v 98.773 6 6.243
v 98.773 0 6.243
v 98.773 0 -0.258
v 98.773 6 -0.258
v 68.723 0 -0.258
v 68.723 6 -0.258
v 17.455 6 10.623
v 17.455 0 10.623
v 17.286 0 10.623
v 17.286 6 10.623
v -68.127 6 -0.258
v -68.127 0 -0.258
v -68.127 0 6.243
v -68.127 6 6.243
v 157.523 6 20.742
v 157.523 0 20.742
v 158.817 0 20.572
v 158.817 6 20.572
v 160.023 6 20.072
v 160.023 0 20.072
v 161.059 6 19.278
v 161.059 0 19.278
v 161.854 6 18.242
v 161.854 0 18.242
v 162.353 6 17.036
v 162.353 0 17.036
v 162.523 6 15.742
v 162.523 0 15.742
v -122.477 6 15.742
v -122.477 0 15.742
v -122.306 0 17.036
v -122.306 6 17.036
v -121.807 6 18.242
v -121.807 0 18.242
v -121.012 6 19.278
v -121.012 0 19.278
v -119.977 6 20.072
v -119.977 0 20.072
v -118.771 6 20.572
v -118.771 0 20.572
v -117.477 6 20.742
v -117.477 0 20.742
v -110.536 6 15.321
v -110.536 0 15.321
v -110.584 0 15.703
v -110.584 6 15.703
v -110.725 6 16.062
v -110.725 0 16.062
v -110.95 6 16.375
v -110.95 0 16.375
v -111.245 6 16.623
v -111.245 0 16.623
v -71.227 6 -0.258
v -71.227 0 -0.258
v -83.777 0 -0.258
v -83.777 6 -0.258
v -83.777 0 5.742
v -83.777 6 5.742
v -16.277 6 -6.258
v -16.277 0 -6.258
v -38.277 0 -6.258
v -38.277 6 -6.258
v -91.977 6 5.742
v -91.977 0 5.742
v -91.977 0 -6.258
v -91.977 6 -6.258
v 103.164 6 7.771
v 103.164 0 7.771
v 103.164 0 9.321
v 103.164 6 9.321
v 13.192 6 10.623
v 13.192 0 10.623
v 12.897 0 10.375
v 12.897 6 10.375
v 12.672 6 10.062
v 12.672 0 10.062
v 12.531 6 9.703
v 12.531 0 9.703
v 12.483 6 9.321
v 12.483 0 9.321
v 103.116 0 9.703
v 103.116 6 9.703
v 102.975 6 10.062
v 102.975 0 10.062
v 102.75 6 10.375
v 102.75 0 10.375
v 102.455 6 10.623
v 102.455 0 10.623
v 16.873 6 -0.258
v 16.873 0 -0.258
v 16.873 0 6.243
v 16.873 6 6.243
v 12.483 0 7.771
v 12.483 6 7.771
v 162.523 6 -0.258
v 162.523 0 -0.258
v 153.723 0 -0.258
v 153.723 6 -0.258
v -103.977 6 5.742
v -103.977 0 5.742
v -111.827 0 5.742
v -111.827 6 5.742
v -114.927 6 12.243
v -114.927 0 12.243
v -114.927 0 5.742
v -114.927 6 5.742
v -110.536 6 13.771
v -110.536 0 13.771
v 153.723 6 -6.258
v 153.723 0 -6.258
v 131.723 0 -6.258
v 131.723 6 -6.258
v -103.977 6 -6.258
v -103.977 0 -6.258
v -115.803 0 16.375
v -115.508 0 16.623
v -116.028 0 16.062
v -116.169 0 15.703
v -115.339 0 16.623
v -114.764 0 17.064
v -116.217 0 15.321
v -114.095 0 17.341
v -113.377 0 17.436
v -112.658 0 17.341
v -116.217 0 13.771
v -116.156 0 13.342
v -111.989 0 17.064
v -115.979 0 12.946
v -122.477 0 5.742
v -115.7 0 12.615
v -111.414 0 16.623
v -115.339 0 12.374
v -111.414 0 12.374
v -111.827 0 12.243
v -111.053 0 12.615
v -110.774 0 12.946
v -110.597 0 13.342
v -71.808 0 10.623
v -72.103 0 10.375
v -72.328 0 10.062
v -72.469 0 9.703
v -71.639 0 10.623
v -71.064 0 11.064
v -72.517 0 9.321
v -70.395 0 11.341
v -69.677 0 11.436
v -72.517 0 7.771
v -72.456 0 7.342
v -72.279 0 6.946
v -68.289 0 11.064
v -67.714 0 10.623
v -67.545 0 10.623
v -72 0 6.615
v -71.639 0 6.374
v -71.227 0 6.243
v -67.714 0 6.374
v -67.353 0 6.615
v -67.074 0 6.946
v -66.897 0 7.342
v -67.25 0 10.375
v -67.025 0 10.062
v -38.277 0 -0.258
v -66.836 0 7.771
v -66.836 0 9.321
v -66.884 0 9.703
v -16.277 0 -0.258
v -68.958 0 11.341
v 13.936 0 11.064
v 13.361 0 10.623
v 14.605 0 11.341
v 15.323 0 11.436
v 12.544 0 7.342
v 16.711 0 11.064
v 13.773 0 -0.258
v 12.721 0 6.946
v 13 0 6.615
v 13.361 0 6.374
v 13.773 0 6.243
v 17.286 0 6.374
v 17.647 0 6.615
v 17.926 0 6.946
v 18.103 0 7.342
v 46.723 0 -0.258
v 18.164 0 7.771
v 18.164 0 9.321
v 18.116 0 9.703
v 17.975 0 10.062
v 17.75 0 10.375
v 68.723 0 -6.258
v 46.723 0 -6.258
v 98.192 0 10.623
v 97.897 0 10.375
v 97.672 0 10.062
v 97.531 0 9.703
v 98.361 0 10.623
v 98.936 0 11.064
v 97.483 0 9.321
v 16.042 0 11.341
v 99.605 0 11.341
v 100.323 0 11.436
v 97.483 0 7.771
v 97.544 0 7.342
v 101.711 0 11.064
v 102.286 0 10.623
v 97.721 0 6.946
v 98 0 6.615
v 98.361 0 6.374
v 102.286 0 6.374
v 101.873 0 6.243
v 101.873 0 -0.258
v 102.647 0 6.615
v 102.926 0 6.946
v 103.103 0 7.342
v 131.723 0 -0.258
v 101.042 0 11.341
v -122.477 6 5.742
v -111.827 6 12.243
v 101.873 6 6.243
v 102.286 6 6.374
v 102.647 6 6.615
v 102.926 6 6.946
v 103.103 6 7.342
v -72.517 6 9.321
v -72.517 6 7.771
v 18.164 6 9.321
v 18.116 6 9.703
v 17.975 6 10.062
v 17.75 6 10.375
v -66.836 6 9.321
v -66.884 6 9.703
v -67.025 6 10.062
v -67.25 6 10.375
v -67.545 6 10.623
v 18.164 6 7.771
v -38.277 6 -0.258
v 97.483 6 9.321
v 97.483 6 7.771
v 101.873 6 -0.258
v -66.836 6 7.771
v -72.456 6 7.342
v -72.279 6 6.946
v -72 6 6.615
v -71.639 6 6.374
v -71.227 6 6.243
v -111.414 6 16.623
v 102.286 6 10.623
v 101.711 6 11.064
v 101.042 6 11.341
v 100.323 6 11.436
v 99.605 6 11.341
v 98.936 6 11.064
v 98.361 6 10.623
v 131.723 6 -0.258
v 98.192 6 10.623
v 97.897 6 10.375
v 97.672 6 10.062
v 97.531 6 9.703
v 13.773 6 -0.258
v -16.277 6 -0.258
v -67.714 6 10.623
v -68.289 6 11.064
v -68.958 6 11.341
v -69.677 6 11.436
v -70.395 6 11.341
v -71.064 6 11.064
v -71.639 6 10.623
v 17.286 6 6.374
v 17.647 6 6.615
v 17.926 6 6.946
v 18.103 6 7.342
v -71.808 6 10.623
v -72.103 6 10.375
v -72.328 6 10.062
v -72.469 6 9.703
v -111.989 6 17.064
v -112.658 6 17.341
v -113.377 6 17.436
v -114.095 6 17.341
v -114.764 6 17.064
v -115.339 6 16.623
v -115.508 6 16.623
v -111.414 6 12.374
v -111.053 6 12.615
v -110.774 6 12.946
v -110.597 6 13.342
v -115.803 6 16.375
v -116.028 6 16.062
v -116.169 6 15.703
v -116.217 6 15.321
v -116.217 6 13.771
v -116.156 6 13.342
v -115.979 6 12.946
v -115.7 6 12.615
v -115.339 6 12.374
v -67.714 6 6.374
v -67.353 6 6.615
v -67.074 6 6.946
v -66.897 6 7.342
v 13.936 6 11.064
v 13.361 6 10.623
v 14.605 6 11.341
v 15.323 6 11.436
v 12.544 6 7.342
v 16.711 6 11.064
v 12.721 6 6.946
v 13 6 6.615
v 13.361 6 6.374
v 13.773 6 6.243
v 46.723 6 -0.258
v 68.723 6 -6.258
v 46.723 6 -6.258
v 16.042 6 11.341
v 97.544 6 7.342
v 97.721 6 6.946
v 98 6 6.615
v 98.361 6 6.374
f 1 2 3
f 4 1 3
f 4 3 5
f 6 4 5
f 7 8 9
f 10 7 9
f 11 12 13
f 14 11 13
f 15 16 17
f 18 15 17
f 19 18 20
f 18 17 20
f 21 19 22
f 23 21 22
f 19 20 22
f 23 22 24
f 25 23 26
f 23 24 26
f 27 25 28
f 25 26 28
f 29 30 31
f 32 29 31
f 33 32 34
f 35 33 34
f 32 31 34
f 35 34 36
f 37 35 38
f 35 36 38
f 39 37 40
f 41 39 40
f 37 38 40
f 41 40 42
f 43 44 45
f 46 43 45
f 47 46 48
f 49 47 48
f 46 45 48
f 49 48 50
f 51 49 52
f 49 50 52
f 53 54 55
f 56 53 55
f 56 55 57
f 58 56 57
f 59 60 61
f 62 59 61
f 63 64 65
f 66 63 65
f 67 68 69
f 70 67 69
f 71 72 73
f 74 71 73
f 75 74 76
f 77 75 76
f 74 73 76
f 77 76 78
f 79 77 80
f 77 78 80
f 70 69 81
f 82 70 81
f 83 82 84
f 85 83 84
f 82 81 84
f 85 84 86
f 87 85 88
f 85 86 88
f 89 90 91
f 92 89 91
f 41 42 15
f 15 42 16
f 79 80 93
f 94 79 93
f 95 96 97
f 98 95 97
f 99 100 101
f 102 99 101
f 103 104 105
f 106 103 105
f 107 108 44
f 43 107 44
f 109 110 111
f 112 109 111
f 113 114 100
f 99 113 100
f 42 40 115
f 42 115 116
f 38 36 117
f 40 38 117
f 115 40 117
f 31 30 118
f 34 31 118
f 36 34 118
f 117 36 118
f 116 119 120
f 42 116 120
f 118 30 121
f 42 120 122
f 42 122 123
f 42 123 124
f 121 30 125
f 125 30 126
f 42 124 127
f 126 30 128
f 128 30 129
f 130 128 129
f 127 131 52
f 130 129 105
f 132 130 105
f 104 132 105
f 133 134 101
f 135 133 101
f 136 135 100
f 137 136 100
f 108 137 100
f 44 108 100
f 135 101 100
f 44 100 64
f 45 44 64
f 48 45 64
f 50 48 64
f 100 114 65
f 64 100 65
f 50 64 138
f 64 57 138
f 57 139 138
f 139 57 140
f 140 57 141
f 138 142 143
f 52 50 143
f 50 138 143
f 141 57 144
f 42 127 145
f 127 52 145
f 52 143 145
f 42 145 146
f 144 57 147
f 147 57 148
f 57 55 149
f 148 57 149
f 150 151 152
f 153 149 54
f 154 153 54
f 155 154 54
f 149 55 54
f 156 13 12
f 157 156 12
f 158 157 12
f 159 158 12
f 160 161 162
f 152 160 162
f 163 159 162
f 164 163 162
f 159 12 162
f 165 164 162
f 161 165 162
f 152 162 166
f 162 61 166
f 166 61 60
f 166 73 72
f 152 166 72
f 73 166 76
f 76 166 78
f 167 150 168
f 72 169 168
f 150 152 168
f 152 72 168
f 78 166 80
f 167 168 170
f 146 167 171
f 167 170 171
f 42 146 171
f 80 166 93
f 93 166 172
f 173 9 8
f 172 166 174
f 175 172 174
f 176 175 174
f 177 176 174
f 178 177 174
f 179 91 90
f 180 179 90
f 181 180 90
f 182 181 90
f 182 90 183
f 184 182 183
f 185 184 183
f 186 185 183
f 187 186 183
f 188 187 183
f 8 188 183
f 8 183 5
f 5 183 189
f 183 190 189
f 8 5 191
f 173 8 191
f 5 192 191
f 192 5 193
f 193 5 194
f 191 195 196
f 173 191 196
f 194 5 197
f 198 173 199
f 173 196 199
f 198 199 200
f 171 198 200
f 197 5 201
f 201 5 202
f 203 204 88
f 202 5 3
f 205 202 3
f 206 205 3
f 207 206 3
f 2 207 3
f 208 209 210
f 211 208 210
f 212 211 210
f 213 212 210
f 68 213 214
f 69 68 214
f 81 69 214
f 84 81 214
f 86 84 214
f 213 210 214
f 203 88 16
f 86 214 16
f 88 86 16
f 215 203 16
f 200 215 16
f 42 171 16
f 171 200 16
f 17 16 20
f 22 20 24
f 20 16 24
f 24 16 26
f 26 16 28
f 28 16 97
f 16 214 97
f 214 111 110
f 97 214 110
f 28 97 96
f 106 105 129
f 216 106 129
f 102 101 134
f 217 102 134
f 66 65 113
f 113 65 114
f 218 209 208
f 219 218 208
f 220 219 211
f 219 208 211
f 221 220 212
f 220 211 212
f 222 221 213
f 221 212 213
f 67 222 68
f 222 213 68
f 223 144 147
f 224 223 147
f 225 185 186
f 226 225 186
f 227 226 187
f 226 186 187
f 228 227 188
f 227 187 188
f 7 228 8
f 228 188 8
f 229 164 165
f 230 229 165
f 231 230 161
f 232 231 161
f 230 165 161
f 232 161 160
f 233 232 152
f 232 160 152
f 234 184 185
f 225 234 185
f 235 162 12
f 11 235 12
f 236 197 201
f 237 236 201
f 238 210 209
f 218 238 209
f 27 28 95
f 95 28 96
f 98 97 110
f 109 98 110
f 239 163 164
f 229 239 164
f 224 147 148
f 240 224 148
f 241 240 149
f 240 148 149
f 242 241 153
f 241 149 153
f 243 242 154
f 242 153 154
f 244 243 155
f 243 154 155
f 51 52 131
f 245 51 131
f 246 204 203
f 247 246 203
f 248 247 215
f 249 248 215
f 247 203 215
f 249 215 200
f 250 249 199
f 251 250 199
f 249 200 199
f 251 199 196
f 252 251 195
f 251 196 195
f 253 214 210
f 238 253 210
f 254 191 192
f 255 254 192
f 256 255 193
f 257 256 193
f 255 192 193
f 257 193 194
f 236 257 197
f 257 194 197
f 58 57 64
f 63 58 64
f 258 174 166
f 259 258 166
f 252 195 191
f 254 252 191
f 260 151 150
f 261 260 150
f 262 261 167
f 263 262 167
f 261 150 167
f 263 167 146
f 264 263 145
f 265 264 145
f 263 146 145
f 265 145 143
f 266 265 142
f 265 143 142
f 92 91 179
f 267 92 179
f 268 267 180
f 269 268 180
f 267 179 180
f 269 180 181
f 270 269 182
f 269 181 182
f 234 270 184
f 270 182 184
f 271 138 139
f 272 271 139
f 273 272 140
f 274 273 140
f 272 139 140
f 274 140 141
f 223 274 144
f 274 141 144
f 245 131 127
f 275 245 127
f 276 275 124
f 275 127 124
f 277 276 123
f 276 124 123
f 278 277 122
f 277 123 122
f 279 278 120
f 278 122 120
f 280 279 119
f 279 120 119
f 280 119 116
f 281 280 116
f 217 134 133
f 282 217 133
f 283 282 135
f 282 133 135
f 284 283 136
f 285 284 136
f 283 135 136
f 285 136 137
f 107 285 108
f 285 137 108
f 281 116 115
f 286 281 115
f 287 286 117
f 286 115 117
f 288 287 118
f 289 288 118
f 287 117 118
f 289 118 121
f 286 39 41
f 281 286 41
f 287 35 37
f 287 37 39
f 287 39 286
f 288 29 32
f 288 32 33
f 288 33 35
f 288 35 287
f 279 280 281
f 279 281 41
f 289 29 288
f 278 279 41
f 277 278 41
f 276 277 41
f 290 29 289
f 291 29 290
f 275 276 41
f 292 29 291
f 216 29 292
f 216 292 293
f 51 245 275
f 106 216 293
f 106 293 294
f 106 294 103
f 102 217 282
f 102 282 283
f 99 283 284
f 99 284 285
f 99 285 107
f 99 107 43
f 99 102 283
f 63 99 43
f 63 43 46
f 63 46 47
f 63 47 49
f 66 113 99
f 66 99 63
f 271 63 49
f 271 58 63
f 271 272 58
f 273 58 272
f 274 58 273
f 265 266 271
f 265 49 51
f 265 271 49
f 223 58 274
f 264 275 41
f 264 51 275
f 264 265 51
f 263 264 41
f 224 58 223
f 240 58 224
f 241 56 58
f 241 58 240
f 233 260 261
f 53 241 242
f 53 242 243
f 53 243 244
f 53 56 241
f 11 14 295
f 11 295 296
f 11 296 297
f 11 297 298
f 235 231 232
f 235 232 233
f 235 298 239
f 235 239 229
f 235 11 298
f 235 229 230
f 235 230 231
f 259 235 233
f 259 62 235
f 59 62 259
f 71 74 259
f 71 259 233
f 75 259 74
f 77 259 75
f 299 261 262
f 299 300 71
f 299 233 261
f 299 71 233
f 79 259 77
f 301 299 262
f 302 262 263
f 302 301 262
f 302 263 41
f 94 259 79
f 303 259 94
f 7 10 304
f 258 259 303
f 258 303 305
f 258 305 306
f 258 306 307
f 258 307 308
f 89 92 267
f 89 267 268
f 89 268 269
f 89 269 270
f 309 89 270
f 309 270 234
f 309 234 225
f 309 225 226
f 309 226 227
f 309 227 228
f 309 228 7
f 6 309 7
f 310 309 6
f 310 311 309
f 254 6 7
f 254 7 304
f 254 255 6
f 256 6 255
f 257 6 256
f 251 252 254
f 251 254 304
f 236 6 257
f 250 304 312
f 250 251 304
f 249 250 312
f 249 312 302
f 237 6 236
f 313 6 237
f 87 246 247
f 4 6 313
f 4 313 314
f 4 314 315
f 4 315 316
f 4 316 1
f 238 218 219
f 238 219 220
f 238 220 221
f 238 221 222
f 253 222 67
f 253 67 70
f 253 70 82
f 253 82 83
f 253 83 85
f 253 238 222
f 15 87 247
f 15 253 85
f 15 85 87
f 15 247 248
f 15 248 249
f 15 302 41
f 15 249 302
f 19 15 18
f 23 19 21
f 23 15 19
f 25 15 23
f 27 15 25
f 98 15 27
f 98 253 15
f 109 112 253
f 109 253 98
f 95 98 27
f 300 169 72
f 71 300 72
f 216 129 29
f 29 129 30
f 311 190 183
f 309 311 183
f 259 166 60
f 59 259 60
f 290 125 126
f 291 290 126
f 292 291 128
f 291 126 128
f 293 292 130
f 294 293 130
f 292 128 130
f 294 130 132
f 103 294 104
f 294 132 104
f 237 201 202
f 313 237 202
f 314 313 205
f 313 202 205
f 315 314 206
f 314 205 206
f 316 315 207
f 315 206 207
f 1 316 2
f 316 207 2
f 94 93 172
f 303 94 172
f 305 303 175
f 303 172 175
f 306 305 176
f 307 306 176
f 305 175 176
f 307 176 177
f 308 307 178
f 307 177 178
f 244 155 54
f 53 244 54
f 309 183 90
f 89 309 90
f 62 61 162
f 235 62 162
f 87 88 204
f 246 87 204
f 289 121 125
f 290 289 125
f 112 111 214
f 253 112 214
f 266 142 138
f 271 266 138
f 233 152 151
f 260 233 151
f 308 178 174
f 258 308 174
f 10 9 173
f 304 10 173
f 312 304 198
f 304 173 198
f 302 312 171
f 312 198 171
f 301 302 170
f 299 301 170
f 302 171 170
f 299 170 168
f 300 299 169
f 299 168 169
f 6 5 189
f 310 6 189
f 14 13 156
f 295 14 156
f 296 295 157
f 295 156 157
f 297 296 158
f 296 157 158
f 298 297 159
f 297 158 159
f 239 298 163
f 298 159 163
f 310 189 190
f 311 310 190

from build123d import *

# Parameters (mm, degrees)
SALIENTE_EXTRUIR1_DEPTH = 6


with BuildPart() as part:
    # Croquis1 → Saliente-Extruir1 (new body)
    with BuildSketch(Plane(origin=(0, 0, 0), x_dir=(1, 0, 0), z_dir=(0, 1, 0))):
        with BuildLine():
            Line((-114.926621199, -5.742358079), (-122.476621199, -5.742358079))
            Line((-122.476621199, -5.742358079), (-122.476621199, -15.742358079))
            ThreePointArc((-122.476621199, -15.742358079), (-121.012155104, -19.277891985), (-117.476621199, -20.742358079))
            Line((-117.476621199, -20.742358079), (157.523378801, -20.742358079))
            ThreePointArc((157.523378801, -20.742358079), (161.058912707, -19.277891985), (162.523378801, -15.742358079))
            Line((162.523378801, -15.742358079), (162.523378801, -0.742358079))
            Line((162.523378801, -0.742358079), (162.523378801, 0.257641921))
            Line((162.523378801, 0.257641921), (154.223378801, 0.257641921))
            Line((154.223378801, 0.257641921), (153.723378801, 0.257641921))
            Line((153.723378801, 0.257641921), (153.723378801, 6.257641921))
            Line((153.723378801, 6.257641921), (131.723378801, 6.257641921))
            Line((131.723378801, 6.257641921), (131.723378801, 0.257641921))
            Line((131.723378801, 0.257641921), (131.223378801, 0.257641921))
            Line((131.223378801, 0.257641921), (101.873378801, 0.257641921))
            Line((101.873378801, 0.257641921), (101.873378801, -6.242583321))
            ThreePointArc((101.873378801, -6.242583321), (102.797983436, -6.770672857), (103.163716432, -7.770678689))
            Line((103.163716432, -7.770678689), (103.163716432, -9.320678689))
            ThreePointArc((103.163716432, -9.320678689), (102.975019602, -10.061862661), (102.454872975, -10.622583321))
            Line((102.454872975, -10.622583321), (102.285628043, -10.622583321))
            ThreePointArc((102.285628043, -10.622583321), (100.323378801, -11.435593306), (98.36112956, -10.622583321))
            Line((98.36112956, -10.622583321), (98.191884628, -10.622583321))
            ThreePointArc((98.191884628, -10.622583321), (97.671738001, -10.061862661), (97.483041171, -9.320678689))
            Line((97.483041171, -9.320678689), (97.483041171, -7.770678689))
            ThreePointArc((97.483041171, -7.770678689), (97.848774167, -6.770672857), (98.773378801, -6.242583321))
            Line((98.773378801, -6.242583321), (98.773378801, 0.257641921))
            Line((98.773378801, 0.257641921), (69.223378801, 0.257641921))
            Line((69.223378801, 0.257641921), (68.723378801, 0.257641921))
            Line((68.723378801, 0.257641921), (68.723378801, 6.257641921))
            Line((68.723378801, 6.257641921), (46.723378801, 6.257641921))
            Line((46.723378801, 6.257641921), (46.723378801, 0.257641921))
            Line((46.723378801, 0.257641921), (46.223378801, 0.257641921))
            Line((46.223378801, 0.257641921), (16.873378801, 0.257641921))
            Line((16.873378801, 0.257641921), (16.873378801, -6.242583321))
            ThreePointArc((16.873378801, -6.242583321), (17.797983436, -6.770672857), (18.163716432, -7.770678689))
            Line((18.163716432, -7.770678689), (18.163716432, -9.320678689))
            ThreePointArc((18.163716432, -9.320678689), (17.975019602, -10.061862661), (17.454872975, -10.622583321))
            Line((17.454872975, -10.622583321), (17.285628043, -10.622583321))
            ThreePointArc((17.285628043, -10.622583321), (15.323378801, -11.435593306), (13.36112956, -10.622583321))
            Line((13.36112956, -10.622583321), (13.191884628, -10.622583321))
            ThreePointArc((13.191884628, -10.622583321), (12.671738001, -10.061862661), (12.483041171, -9.320678689))
            Line((12.483041171, -9.320678689), (12.483041171, -7.770678689))
            ThreePointArc((12.483041171, -7.770678689), (12.848774167, -6.770672857), (13.773378801, -6.242583321))
            Line((13.773378801, -6.242583321), (13.773378801, 0.257641921))
            Line((13.773378801, 0.257641921), (-14.776621199, 0.257641921))
            Line((-14.776621199, 0.257641921), (-15.776621199, 0.257641921))
            Line((-15.776621199, 0.257641921), (-16.276621199, 0.257641921))
            Line((-16.276621199, 0.257641921), (-16.276621199, 6.257641921))
            Line((-16.276621199, 6.257641921), (-38.276621199, 6.257641921))
            Line((-38.276621199, 6.257641921), (-38.276621199, 0.257641921))
            Line((-38.276621199, 0.257641921), (-38.776621199, 0.257641921))
            Line((-38.776621199, 0.257641921), (-39.776621199, 0.257641921))
            Line((-39.776621199, 0.257641921), (-68.126621199, 0.257641921))
            Line((-68.126621199, 0.257641921), (-68.126621199, -6.242583321))
            ThreePointArc((-68.126621199, -6.242583321), (-67.202016564, -6.770672857), (-66.836283568, -7.770678689))
            Line((-66.836283568, -7.770678689), (-66.836283568, -9.320678689))
            ThreePointArc((-66.836283568, -9.320678689), (-67.024980398, -10.061862661), (-67.545127025, -10.622583321))
            Line((-67.545127025, -10.622583321), (-67.714371957, -10.622583321))
            ThreePointArc((-67.714371957, -10.622583321), (-69.676621199, -11.435593306), (-71.63887044, -10.622583321))
            Line((-71.63887044, -10.622583321), (-71.808115372, -10.622583321))
            ThreePointArc((-71.808115372, -10.622583321), (-72.328261999, -10.061862661), (-72.516958829, -9.320678689))
            Line((-72.516958829, -9.320678689), (-72.516958829, -7.770678689))
            ThreePointArc((-72.516958829, -7.770678689), (-72.151225833, -6.770672857), (-71.226621199, -6.242583321))
            Line((-71.226621199, -6.242583321), (-71.226621199, 0.257641921))
            Line((-71.226621199, 0.257641921), (-83.776621199, 0.257641921))
            Line((-83.776621199, 0.257641921), (-83.776621199, -5.742358079))
            Line((-83.776621199, -5.742358079), (-90.476621199, -5.742358079))
            Line((-90.476621199, -5.742358079), (-91.476621199, -5.742358079))
            Line((-91.476621199, -5.742358079), (-91.976621199, -5.742358079))
            Line((-91.976621199, -5.742358079), (-91.976621199, 6.257641921))
            Line((-91.976621199, 6.257641921), (-103.976621199, 6.257641921))
            Line((-103.976621199, 6.257641921), (-103.976621199, -5.742358079))
            Line((-103.976621199, -5.742358079), (-104.476621199, -5.742358079))
            Line((-104.476621199, -5.742358079), (-105.476621199, -5.742358079))
            Line((-105.476621199, -5.742358079), (-111.826621199, -5.742358079))
            Line((-111.826621199, -5.742358079), (-111.826621199, -12.242583321))
            ThreePointArc((-111.826621199, -12.242583321), (-110.902016564, -12.770672857), (-110.536283568, -13.770678689))
            Line((-110.536283568, -13.770678689), (-110.536283568, -15.320678689))
            ThreePointArc((-110.536283568, -15.320678689), (-110.724980398, -16.061862661), (-111.245127025, -16.622583321))
            Line((-111.245127025, -16.622583321), (-111.414371957, -16.622583321))
            ThreePointArc((-111.414371957, -16.622583321), (-113.376621199, -17.435593306), (-115.33887044, -16.622583321))
            Line((-115.33887044, -16.622583321), (-115.508115372, -16.622583321))
            ThreePointArc((-115.508115372, -16.622583321), (-116.028261999, -16.061862661), (-116.216958829, -15.320678689))
            Line((-116.216958829, -15.320678689), (-116.216958829, -13.770678689))
            ThreePointArc((-116.216958829, -13.770678689), (-115.851225833, -12.770672857), (-114.926621199, -12.242583321))
            Line((-114.926621199, -12.242583321), (-114.926621199, -5.742358079))
        make_face()
    extrude(amount=SALIENTE_EXTRUIR1_DEPTH)


solid = part.part
